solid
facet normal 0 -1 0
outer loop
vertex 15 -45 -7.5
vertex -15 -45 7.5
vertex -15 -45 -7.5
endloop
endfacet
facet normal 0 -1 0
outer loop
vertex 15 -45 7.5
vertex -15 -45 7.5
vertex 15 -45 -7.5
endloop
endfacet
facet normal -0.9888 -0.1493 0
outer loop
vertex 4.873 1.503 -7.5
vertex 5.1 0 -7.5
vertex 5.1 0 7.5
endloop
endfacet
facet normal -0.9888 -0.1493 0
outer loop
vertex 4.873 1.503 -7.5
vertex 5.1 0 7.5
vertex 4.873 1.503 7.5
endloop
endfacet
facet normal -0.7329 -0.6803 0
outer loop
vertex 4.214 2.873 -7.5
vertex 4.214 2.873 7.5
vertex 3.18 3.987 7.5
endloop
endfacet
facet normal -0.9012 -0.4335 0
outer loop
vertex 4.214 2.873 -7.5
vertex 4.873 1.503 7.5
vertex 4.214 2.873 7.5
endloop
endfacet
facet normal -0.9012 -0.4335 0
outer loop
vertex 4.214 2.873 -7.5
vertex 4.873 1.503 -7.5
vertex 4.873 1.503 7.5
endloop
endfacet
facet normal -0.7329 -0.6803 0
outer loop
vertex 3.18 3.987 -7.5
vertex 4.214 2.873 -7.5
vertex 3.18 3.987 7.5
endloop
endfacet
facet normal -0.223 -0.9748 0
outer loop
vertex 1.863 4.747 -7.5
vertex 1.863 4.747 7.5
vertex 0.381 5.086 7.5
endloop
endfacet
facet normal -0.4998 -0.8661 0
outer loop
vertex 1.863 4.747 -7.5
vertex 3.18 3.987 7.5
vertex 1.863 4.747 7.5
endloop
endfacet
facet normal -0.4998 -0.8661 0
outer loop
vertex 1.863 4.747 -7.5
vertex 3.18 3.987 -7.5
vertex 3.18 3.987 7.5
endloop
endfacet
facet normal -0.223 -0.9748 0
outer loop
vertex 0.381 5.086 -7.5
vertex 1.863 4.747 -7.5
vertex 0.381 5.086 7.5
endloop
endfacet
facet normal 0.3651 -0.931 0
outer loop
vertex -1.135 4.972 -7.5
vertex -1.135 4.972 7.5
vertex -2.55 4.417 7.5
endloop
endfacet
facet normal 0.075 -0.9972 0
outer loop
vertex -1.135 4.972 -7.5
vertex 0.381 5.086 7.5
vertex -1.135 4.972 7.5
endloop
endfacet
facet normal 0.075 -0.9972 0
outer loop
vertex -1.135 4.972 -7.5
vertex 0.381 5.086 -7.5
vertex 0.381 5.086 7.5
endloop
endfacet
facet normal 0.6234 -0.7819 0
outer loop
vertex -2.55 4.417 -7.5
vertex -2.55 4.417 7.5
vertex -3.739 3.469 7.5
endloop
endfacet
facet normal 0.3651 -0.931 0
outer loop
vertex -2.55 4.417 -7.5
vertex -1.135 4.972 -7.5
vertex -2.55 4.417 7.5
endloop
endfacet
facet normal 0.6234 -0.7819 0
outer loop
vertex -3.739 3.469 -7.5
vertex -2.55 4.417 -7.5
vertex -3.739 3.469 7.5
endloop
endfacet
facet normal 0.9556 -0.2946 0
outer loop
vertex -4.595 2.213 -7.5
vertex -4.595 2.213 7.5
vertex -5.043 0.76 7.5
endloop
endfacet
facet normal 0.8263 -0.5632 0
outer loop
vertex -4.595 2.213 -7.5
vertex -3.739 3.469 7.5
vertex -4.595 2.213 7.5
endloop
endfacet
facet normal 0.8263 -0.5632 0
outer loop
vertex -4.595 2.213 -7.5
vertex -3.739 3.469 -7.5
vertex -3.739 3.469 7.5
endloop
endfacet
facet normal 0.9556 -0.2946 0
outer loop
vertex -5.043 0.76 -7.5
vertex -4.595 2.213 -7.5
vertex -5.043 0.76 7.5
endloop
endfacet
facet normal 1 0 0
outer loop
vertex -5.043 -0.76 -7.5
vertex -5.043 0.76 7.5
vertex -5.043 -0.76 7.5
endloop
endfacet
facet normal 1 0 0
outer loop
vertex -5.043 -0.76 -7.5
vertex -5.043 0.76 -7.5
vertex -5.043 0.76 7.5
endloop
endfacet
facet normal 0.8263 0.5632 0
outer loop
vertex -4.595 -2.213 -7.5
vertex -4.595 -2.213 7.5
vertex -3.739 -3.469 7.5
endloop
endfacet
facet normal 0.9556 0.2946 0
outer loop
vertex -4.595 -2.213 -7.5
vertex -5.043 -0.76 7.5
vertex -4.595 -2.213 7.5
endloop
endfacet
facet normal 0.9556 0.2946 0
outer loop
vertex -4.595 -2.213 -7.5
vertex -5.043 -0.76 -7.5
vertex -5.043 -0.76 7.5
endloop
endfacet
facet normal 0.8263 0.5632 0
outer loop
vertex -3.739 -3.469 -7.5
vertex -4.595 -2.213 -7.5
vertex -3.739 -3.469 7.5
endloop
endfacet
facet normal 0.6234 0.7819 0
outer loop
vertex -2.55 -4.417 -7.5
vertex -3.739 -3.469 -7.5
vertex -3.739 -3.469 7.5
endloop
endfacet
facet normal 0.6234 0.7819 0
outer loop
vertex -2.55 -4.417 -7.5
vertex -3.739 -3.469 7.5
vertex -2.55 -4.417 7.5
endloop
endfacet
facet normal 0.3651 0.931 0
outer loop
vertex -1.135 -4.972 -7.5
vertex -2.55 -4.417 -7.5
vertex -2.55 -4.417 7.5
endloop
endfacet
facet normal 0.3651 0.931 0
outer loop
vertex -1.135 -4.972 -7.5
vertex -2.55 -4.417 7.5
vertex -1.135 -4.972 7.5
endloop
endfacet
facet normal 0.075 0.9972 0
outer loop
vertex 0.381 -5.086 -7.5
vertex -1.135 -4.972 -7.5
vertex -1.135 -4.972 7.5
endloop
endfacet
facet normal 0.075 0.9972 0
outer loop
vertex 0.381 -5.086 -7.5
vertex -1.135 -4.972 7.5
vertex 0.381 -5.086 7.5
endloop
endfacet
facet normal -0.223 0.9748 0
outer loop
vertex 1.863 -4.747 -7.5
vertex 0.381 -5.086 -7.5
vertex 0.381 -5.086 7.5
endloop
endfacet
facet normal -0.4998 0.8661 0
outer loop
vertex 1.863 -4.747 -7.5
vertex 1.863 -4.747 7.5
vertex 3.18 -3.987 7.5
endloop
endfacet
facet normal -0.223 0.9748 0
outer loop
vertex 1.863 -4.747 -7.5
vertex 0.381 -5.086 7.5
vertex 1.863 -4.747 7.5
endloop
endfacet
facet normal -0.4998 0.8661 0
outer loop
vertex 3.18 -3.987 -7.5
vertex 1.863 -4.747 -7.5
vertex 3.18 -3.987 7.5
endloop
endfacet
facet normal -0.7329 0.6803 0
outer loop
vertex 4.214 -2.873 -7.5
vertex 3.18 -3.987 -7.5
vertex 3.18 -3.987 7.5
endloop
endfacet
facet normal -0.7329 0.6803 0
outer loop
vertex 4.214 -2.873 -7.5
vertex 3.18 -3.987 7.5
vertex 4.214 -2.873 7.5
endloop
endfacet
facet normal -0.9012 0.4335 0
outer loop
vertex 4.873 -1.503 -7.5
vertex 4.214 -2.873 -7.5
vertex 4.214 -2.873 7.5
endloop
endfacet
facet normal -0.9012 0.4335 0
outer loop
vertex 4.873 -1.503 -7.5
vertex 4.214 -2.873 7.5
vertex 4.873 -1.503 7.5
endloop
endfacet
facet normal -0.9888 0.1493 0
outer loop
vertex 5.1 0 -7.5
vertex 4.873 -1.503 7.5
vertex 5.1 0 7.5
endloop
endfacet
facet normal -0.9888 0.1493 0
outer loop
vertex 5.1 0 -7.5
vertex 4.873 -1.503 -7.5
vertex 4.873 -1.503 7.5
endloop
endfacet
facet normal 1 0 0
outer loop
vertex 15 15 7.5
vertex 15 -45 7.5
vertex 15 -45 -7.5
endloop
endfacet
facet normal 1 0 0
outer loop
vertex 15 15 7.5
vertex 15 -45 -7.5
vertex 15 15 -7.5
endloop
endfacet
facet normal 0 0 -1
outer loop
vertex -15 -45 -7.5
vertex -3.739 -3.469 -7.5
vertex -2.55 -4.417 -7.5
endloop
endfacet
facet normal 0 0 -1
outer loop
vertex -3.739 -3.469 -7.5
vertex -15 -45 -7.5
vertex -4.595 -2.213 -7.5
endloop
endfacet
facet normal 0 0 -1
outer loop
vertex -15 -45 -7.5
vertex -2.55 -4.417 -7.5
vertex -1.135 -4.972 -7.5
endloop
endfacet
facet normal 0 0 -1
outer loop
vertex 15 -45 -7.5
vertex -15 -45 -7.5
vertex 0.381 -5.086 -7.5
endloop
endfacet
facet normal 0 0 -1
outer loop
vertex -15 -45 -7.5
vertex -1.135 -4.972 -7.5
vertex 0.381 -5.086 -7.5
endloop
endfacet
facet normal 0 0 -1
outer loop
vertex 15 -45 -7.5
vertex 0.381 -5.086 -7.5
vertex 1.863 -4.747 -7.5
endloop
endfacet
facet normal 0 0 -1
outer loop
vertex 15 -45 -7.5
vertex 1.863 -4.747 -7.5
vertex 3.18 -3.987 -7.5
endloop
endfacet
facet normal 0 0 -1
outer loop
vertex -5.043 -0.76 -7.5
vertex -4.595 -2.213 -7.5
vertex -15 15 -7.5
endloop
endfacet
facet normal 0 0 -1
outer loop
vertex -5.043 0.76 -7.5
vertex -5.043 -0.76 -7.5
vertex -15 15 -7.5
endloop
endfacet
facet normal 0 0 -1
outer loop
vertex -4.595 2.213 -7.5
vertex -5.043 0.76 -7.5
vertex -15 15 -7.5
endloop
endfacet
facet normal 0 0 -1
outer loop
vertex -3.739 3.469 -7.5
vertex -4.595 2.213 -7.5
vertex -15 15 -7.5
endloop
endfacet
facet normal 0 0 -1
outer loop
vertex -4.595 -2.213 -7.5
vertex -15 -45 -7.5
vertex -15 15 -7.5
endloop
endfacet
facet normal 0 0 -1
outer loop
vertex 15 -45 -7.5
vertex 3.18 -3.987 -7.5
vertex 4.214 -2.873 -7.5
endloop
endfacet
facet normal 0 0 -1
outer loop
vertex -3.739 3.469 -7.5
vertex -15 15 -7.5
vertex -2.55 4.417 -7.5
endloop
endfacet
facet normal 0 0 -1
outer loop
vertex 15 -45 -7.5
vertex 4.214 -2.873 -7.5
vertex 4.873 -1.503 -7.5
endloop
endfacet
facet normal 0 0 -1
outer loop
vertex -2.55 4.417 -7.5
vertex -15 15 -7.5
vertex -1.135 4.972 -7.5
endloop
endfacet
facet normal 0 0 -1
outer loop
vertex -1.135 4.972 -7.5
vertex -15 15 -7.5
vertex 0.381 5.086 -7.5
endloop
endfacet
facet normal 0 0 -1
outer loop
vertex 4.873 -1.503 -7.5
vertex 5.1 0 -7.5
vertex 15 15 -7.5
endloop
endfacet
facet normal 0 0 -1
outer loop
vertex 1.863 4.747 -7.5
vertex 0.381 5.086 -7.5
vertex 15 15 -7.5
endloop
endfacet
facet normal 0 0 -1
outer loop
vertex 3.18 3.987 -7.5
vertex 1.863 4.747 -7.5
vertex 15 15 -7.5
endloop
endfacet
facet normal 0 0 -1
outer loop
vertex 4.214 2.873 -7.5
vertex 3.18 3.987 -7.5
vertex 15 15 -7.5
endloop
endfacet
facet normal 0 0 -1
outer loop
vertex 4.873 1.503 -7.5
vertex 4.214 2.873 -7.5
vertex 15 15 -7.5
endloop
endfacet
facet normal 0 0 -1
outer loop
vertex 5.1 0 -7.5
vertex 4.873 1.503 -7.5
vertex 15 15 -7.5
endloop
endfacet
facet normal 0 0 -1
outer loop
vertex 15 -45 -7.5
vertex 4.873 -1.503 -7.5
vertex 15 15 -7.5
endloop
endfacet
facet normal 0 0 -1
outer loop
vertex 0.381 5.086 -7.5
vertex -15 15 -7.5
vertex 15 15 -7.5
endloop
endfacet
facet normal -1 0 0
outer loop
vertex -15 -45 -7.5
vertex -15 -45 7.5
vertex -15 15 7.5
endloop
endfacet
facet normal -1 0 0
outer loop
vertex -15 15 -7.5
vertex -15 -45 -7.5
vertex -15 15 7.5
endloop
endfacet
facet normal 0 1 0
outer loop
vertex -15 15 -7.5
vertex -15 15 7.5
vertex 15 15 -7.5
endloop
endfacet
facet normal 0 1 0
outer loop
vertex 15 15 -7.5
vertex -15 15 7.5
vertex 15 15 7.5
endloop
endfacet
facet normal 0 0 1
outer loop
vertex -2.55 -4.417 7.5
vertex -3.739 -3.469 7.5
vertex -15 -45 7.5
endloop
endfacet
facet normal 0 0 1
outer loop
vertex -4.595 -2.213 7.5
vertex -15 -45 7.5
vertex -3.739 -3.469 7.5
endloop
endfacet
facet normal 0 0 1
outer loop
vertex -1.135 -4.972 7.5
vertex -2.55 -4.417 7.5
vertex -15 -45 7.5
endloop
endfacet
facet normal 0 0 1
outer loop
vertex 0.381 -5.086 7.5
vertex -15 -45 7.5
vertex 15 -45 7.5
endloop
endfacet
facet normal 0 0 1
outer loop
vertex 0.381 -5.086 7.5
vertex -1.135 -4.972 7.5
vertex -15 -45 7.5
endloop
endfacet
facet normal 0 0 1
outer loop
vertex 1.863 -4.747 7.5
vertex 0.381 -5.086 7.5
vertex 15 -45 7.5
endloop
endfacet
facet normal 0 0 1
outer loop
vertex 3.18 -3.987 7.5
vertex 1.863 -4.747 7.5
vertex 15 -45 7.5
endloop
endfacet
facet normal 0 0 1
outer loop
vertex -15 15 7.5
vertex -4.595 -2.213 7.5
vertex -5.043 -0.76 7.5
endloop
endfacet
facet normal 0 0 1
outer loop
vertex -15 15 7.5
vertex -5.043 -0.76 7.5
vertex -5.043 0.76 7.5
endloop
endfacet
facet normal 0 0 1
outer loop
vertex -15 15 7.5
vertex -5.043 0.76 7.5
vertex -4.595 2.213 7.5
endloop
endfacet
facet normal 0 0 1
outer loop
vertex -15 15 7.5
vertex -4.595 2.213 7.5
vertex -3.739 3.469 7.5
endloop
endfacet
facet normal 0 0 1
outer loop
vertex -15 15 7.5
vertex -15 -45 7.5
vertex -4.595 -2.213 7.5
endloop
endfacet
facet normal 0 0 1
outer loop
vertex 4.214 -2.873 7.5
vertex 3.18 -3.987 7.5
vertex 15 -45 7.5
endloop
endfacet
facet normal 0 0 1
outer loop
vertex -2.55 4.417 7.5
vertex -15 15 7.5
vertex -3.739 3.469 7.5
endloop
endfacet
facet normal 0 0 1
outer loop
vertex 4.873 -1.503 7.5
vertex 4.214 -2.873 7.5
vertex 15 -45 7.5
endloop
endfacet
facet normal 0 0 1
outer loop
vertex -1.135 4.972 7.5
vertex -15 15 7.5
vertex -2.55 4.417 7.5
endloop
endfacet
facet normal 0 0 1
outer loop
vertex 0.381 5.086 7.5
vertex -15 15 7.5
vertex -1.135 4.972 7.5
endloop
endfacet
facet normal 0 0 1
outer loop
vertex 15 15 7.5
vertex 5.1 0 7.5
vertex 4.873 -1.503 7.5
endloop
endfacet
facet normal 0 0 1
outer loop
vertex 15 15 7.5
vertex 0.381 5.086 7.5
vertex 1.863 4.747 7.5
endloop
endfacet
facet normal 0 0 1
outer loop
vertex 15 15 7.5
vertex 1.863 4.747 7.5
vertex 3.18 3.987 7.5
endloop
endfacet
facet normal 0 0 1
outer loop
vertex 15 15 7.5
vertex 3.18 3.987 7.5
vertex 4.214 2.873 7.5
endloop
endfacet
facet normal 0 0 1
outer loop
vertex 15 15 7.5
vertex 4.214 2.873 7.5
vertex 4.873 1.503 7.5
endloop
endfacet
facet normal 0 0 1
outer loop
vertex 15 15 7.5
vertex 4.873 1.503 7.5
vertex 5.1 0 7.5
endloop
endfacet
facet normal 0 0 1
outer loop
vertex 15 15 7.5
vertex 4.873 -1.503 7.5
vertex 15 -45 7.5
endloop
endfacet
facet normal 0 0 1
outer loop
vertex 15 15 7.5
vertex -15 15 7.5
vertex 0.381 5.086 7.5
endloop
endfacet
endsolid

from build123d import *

# Parameters (mm, degrees)
SKETCH1_W               = 30
SKETCH1_H               = 60
BOSS_EXTRUDE1_DEPTH     = 7.5
CUT_EXTRUDE1_DEPTH      = 49.023431781
CUT_EXTRUDE1_DEPTH_BACK = 49.023431781
SKETCH2_R               = 5.1


with BuildPart() as part:
    # Sketch1 → Boss-Extrude1 (new, symmetric)
    with BuildSketch(Plane.XY):
        with Locations((0, -15)):
            Rectangle(SKETCH1_W, SKETCH1_H)
    extrude(amount=BOSS_EXTRUDE1_DEPTH, both=True)

    # Sketch2 → Cut-Extrude1 (cut, two sides: drawn at the far end of the back side and taken through both)
    with BuildSketch(Plane.XY.offset(-CUT_EXTRUDE1_DEPTH_BACK)):
        Circle(SKETCH2_R)
    extrude(amount=CUT_EXTRUDE1_DEPTH + CUT_EXTRUDE1_DEPTH_BACK, mode=Mode.SUBTRACT)


solid = part.part
